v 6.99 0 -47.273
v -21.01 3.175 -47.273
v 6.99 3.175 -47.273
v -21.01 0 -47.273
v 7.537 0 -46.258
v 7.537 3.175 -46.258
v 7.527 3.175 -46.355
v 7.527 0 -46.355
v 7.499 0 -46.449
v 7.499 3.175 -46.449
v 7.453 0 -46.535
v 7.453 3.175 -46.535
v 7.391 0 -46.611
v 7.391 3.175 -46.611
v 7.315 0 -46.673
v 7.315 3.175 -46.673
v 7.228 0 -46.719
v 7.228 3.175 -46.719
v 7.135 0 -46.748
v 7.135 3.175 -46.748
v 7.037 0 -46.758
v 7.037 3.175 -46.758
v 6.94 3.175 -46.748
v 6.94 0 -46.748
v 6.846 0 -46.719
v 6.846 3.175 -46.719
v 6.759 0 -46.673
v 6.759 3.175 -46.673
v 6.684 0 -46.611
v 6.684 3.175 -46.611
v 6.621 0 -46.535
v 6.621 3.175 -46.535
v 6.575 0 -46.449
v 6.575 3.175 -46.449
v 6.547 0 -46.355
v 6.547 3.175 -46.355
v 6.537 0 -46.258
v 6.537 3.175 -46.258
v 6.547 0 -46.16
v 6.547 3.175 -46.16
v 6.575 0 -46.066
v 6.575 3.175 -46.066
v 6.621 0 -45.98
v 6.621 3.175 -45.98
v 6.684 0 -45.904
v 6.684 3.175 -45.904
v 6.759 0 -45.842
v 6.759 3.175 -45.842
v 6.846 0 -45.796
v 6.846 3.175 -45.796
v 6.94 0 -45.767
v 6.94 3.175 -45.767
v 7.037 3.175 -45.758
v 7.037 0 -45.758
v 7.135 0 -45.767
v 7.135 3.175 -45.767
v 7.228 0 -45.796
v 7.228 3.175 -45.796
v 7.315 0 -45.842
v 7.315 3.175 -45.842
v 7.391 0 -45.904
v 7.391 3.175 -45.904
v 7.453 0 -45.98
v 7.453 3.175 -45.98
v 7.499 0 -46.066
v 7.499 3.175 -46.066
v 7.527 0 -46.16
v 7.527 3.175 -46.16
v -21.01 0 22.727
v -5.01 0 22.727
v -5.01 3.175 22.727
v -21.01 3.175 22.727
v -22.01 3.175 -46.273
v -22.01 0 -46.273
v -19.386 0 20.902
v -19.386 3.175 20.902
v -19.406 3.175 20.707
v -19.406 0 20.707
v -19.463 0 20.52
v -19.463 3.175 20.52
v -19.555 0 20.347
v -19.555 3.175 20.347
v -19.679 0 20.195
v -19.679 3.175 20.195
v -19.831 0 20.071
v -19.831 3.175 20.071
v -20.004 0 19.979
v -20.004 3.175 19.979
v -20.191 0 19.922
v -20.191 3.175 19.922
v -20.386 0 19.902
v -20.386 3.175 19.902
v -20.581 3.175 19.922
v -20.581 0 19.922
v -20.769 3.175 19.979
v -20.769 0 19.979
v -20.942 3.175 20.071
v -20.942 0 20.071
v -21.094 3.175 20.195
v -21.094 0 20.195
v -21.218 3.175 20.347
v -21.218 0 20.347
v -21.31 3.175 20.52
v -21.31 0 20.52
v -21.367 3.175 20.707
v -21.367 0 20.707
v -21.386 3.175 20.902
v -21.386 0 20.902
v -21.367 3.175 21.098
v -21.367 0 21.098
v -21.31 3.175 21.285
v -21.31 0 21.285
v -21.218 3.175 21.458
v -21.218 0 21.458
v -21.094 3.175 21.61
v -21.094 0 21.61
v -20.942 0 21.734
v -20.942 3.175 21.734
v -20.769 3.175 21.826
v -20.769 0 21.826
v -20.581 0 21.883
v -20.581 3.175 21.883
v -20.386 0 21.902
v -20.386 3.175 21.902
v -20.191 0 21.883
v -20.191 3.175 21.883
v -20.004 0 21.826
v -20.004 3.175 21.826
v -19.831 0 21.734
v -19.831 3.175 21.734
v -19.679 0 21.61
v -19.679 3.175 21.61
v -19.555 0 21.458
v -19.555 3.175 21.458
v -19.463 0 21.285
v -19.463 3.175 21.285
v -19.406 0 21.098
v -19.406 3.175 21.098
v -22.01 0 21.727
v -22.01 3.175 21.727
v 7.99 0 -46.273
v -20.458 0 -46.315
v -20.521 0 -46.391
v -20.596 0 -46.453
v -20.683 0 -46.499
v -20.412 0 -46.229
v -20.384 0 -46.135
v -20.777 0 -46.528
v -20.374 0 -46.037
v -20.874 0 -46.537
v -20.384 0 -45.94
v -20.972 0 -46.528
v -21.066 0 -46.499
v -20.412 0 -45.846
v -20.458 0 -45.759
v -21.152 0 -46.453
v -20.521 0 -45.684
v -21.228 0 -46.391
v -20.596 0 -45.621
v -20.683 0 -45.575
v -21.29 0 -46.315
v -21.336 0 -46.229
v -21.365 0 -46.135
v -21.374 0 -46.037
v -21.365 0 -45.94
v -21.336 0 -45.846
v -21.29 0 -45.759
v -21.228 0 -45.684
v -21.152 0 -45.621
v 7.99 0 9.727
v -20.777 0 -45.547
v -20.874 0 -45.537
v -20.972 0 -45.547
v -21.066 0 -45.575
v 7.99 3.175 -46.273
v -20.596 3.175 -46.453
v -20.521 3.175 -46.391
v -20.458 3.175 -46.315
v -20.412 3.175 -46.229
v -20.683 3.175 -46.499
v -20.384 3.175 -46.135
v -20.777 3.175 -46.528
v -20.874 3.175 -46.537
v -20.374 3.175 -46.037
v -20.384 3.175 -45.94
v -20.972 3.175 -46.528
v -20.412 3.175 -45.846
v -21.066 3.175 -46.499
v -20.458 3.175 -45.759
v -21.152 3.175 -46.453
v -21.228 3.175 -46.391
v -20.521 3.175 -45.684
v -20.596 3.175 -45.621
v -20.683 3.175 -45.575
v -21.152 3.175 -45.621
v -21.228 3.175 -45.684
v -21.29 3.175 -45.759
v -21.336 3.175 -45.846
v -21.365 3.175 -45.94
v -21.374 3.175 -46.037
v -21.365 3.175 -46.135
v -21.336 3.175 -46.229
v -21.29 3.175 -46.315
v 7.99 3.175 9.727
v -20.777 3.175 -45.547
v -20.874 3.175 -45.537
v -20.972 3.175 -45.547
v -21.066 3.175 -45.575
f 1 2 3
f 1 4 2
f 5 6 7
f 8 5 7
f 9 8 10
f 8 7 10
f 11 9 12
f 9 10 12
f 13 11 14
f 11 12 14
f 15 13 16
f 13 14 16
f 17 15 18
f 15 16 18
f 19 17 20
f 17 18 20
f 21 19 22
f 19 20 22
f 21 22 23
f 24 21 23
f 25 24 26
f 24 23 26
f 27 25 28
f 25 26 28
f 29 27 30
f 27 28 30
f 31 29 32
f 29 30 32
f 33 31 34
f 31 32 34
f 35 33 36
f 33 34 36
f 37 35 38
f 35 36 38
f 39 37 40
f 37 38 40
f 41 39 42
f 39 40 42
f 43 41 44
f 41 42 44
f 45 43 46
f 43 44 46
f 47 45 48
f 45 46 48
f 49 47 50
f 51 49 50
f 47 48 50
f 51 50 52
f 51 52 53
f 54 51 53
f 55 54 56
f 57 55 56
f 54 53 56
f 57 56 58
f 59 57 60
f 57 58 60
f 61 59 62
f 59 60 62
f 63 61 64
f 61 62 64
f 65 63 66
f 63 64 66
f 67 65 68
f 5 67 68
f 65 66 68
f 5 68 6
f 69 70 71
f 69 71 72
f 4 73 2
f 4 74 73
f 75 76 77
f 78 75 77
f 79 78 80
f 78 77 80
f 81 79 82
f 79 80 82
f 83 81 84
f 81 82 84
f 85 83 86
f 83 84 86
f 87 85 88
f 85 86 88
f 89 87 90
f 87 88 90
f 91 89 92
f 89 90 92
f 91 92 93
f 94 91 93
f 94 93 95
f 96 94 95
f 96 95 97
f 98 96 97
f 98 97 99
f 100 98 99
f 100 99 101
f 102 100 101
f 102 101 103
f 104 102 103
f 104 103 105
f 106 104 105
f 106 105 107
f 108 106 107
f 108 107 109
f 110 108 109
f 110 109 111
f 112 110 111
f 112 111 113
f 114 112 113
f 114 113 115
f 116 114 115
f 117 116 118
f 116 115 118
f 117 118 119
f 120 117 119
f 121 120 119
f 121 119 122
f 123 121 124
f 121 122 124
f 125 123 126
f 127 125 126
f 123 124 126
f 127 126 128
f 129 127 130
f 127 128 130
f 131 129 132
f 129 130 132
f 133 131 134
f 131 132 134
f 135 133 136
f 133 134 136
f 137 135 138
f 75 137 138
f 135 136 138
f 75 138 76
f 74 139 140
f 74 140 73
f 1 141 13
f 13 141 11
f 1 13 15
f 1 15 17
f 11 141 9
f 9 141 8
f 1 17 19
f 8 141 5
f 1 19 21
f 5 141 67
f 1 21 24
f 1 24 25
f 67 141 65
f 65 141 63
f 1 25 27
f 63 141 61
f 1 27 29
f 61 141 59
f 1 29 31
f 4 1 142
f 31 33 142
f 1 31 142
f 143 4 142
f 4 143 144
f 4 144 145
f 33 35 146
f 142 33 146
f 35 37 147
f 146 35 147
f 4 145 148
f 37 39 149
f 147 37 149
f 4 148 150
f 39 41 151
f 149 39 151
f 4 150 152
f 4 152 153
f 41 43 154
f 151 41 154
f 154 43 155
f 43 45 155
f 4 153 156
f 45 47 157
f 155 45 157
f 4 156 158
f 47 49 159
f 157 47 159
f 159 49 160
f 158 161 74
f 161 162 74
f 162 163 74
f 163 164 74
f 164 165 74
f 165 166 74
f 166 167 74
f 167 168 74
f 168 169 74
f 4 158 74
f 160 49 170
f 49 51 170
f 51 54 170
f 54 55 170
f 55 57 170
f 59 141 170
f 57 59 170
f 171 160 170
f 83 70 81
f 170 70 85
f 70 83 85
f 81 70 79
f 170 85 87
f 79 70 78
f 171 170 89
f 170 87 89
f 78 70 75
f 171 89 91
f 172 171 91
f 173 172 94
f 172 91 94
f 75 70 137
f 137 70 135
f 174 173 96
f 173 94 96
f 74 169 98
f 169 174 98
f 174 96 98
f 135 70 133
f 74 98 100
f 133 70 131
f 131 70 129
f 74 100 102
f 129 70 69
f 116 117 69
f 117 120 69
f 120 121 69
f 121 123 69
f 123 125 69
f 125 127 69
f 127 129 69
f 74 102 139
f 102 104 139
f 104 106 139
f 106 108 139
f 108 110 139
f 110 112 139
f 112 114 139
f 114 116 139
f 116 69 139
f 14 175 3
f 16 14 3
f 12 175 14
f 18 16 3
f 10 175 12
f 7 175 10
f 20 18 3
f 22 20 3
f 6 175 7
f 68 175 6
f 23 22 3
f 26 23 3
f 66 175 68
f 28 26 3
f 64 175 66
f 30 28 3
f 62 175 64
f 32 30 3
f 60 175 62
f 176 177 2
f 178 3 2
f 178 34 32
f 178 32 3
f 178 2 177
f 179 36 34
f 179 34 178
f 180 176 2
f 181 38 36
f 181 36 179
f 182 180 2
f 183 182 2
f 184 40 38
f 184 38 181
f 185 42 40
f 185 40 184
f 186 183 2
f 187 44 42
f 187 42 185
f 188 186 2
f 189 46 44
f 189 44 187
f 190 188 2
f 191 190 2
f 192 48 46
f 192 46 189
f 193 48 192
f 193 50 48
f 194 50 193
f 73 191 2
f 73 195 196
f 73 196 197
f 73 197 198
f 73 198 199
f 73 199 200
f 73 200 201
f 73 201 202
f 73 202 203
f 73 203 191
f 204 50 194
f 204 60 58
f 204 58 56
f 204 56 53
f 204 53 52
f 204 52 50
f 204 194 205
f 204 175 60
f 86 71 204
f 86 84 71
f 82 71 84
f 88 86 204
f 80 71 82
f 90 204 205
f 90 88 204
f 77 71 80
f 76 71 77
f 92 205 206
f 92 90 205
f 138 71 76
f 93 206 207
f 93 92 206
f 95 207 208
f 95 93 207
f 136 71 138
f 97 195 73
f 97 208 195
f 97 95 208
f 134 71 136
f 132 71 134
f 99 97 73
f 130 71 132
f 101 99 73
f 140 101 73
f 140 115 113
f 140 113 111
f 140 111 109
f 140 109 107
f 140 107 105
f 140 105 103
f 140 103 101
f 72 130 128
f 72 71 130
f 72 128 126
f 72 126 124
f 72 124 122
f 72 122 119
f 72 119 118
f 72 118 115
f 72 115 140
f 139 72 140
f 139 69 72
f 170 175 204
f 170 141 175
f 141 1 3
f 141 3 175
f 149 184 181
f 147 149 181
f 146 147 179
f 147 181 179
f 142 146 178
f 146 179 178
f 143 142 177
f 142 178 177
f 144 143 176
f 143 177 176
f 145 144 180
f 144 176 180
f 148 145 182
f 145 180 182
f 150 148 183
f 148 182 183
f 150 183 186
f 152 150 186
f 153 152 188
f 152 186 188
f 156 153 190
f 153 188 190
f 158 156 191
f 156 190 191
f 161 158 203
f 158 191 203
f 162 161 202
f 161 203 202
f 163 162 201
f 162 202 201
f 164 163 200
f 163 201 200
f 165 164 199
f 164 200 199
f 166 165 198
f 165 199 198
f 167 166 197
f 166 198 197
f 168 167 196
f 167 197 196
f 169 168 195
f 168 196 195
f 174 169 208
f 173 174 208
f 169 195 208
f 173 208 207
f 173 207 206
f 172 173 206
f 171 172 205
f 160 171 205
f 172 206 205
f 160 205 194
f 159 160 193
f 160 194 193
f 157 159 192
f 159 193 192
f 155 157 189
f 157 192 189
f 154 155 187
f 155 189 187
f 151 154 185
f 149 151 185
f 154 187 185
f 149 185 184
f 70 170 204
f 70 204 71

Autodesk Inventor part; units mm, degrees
ref_plane "YZ Plane" through (0, 0, 0) normal (1, 0, 0) x (0, 1, 0)
ref_plane "XZ Plane" through (0, 0, 0) normal (0, 1, 0) x (-1, 0, 0)
sketch "Sketch1" plane through (0, 0, 0) normal (0, 1, 0) x (-1, 0, 0)
  line L0 (21.5102, 17.7267) -> (21.5102, -43.9733)
  line L1 (21.5102, -43.9733) -> (19.1102, -46.7733)
  line L2 (19.1102, -46.7733) -> (-5.4898, -46.7733)
  line L3 (-5.4898, -46.7733) -> (-7.4898, -44.7733)
  line L4 (-7.4898, -44.7733) -> (-7.4898, 9.2267)
  line L5 (-7.4898, 9.2267) -> (5.5102, 22.2267)
  line L6 (5.5102, 22.2267) -> (17.0102, 22.2267)
  line L7 (17.0102, 22.2267) -> (21.5102, 17.7267)
  line L8 (22.0102, 21.7267) -> (22.0102, -46.2733)
  line L9 (22.0102, -46.2733) -> (21.0102, -47.2733)
  line L10 (21.0102, -47.2733) -> (-6.9898, -47.2733)
  line L11 (-6.9898, -47.2733) -> (-7.9898, -46.2733)
  line L12 (-7.9898, -46.2733) -> (-7.9898, 9.7267)
  line L13 (-7.9898, 9.7267) -> (5.0102, 22.7267)
  line L14 (5.0102, 22.7267) -> (21.0102, 22.7267)
  line L15 (21.0102, 22.7267) -> (22.0102, 21.7267)
  point P0 (0, 0)
  point P1 (14.1019, -14.4492)
  dimension "d0" = 69
  dimension "d1" = 29
  dimension "d2" = 2
  dimension "d3" = 2
  dimension "d4" = 2.8
  dimension "d5" = 2.4
  dimension "d6" = 4.5
  dimension "d7" = 4.5
  dimension "d8" = 13
  dimension "d9" = 13
  dimension "d10" = 70
  dimension "d11" = 30
  dimension "d12" = 1
  dimension "d13" = 1
  dimension "d14" = 1
  dimension "d15" = 1
  dimension "d16" = 1
  dimension "d17" = 1
  dimension "d18" = 13
  dimension "d19" = 13
  dimension "d34" = 0.5
  dimension "d35" = 0.5
extrude "Extrusion1" add sketch "Sketch1" along normal blind 3.175 contours L0 L1 L2 L3 L4 L5 L6 L7 | L8 L9 L10 L11 L12 L13 L14 L15
ref_plane "Work Plane3" through (0, 0.5, 0) normal (0, 1, 0) x (1, 0, 0)
sketch "Sketch5" plane through (0, 0.5, 0) normal (0, 1, 0) x (1, 0, 0)
  circle A0 centre (-20.3864, -20.9025) radius 1
  circle A1 centre (-20.8742, 46.0372) radius 0.5
  circle A2 centre (7.0371, 46.2575) radius 0.5
  point P0 (0, 0)
  dimension "d55" = 2
  dimension "d56" = 1
  dimension "d57" = 1
extrude "Extrusion6" cut sketch "Sketch5" along normal blind 3.175 and the other way blind 1.6002
equation "\"d9\" = d8"
equation "\"d19\" = d18"
properties part number "Top"
